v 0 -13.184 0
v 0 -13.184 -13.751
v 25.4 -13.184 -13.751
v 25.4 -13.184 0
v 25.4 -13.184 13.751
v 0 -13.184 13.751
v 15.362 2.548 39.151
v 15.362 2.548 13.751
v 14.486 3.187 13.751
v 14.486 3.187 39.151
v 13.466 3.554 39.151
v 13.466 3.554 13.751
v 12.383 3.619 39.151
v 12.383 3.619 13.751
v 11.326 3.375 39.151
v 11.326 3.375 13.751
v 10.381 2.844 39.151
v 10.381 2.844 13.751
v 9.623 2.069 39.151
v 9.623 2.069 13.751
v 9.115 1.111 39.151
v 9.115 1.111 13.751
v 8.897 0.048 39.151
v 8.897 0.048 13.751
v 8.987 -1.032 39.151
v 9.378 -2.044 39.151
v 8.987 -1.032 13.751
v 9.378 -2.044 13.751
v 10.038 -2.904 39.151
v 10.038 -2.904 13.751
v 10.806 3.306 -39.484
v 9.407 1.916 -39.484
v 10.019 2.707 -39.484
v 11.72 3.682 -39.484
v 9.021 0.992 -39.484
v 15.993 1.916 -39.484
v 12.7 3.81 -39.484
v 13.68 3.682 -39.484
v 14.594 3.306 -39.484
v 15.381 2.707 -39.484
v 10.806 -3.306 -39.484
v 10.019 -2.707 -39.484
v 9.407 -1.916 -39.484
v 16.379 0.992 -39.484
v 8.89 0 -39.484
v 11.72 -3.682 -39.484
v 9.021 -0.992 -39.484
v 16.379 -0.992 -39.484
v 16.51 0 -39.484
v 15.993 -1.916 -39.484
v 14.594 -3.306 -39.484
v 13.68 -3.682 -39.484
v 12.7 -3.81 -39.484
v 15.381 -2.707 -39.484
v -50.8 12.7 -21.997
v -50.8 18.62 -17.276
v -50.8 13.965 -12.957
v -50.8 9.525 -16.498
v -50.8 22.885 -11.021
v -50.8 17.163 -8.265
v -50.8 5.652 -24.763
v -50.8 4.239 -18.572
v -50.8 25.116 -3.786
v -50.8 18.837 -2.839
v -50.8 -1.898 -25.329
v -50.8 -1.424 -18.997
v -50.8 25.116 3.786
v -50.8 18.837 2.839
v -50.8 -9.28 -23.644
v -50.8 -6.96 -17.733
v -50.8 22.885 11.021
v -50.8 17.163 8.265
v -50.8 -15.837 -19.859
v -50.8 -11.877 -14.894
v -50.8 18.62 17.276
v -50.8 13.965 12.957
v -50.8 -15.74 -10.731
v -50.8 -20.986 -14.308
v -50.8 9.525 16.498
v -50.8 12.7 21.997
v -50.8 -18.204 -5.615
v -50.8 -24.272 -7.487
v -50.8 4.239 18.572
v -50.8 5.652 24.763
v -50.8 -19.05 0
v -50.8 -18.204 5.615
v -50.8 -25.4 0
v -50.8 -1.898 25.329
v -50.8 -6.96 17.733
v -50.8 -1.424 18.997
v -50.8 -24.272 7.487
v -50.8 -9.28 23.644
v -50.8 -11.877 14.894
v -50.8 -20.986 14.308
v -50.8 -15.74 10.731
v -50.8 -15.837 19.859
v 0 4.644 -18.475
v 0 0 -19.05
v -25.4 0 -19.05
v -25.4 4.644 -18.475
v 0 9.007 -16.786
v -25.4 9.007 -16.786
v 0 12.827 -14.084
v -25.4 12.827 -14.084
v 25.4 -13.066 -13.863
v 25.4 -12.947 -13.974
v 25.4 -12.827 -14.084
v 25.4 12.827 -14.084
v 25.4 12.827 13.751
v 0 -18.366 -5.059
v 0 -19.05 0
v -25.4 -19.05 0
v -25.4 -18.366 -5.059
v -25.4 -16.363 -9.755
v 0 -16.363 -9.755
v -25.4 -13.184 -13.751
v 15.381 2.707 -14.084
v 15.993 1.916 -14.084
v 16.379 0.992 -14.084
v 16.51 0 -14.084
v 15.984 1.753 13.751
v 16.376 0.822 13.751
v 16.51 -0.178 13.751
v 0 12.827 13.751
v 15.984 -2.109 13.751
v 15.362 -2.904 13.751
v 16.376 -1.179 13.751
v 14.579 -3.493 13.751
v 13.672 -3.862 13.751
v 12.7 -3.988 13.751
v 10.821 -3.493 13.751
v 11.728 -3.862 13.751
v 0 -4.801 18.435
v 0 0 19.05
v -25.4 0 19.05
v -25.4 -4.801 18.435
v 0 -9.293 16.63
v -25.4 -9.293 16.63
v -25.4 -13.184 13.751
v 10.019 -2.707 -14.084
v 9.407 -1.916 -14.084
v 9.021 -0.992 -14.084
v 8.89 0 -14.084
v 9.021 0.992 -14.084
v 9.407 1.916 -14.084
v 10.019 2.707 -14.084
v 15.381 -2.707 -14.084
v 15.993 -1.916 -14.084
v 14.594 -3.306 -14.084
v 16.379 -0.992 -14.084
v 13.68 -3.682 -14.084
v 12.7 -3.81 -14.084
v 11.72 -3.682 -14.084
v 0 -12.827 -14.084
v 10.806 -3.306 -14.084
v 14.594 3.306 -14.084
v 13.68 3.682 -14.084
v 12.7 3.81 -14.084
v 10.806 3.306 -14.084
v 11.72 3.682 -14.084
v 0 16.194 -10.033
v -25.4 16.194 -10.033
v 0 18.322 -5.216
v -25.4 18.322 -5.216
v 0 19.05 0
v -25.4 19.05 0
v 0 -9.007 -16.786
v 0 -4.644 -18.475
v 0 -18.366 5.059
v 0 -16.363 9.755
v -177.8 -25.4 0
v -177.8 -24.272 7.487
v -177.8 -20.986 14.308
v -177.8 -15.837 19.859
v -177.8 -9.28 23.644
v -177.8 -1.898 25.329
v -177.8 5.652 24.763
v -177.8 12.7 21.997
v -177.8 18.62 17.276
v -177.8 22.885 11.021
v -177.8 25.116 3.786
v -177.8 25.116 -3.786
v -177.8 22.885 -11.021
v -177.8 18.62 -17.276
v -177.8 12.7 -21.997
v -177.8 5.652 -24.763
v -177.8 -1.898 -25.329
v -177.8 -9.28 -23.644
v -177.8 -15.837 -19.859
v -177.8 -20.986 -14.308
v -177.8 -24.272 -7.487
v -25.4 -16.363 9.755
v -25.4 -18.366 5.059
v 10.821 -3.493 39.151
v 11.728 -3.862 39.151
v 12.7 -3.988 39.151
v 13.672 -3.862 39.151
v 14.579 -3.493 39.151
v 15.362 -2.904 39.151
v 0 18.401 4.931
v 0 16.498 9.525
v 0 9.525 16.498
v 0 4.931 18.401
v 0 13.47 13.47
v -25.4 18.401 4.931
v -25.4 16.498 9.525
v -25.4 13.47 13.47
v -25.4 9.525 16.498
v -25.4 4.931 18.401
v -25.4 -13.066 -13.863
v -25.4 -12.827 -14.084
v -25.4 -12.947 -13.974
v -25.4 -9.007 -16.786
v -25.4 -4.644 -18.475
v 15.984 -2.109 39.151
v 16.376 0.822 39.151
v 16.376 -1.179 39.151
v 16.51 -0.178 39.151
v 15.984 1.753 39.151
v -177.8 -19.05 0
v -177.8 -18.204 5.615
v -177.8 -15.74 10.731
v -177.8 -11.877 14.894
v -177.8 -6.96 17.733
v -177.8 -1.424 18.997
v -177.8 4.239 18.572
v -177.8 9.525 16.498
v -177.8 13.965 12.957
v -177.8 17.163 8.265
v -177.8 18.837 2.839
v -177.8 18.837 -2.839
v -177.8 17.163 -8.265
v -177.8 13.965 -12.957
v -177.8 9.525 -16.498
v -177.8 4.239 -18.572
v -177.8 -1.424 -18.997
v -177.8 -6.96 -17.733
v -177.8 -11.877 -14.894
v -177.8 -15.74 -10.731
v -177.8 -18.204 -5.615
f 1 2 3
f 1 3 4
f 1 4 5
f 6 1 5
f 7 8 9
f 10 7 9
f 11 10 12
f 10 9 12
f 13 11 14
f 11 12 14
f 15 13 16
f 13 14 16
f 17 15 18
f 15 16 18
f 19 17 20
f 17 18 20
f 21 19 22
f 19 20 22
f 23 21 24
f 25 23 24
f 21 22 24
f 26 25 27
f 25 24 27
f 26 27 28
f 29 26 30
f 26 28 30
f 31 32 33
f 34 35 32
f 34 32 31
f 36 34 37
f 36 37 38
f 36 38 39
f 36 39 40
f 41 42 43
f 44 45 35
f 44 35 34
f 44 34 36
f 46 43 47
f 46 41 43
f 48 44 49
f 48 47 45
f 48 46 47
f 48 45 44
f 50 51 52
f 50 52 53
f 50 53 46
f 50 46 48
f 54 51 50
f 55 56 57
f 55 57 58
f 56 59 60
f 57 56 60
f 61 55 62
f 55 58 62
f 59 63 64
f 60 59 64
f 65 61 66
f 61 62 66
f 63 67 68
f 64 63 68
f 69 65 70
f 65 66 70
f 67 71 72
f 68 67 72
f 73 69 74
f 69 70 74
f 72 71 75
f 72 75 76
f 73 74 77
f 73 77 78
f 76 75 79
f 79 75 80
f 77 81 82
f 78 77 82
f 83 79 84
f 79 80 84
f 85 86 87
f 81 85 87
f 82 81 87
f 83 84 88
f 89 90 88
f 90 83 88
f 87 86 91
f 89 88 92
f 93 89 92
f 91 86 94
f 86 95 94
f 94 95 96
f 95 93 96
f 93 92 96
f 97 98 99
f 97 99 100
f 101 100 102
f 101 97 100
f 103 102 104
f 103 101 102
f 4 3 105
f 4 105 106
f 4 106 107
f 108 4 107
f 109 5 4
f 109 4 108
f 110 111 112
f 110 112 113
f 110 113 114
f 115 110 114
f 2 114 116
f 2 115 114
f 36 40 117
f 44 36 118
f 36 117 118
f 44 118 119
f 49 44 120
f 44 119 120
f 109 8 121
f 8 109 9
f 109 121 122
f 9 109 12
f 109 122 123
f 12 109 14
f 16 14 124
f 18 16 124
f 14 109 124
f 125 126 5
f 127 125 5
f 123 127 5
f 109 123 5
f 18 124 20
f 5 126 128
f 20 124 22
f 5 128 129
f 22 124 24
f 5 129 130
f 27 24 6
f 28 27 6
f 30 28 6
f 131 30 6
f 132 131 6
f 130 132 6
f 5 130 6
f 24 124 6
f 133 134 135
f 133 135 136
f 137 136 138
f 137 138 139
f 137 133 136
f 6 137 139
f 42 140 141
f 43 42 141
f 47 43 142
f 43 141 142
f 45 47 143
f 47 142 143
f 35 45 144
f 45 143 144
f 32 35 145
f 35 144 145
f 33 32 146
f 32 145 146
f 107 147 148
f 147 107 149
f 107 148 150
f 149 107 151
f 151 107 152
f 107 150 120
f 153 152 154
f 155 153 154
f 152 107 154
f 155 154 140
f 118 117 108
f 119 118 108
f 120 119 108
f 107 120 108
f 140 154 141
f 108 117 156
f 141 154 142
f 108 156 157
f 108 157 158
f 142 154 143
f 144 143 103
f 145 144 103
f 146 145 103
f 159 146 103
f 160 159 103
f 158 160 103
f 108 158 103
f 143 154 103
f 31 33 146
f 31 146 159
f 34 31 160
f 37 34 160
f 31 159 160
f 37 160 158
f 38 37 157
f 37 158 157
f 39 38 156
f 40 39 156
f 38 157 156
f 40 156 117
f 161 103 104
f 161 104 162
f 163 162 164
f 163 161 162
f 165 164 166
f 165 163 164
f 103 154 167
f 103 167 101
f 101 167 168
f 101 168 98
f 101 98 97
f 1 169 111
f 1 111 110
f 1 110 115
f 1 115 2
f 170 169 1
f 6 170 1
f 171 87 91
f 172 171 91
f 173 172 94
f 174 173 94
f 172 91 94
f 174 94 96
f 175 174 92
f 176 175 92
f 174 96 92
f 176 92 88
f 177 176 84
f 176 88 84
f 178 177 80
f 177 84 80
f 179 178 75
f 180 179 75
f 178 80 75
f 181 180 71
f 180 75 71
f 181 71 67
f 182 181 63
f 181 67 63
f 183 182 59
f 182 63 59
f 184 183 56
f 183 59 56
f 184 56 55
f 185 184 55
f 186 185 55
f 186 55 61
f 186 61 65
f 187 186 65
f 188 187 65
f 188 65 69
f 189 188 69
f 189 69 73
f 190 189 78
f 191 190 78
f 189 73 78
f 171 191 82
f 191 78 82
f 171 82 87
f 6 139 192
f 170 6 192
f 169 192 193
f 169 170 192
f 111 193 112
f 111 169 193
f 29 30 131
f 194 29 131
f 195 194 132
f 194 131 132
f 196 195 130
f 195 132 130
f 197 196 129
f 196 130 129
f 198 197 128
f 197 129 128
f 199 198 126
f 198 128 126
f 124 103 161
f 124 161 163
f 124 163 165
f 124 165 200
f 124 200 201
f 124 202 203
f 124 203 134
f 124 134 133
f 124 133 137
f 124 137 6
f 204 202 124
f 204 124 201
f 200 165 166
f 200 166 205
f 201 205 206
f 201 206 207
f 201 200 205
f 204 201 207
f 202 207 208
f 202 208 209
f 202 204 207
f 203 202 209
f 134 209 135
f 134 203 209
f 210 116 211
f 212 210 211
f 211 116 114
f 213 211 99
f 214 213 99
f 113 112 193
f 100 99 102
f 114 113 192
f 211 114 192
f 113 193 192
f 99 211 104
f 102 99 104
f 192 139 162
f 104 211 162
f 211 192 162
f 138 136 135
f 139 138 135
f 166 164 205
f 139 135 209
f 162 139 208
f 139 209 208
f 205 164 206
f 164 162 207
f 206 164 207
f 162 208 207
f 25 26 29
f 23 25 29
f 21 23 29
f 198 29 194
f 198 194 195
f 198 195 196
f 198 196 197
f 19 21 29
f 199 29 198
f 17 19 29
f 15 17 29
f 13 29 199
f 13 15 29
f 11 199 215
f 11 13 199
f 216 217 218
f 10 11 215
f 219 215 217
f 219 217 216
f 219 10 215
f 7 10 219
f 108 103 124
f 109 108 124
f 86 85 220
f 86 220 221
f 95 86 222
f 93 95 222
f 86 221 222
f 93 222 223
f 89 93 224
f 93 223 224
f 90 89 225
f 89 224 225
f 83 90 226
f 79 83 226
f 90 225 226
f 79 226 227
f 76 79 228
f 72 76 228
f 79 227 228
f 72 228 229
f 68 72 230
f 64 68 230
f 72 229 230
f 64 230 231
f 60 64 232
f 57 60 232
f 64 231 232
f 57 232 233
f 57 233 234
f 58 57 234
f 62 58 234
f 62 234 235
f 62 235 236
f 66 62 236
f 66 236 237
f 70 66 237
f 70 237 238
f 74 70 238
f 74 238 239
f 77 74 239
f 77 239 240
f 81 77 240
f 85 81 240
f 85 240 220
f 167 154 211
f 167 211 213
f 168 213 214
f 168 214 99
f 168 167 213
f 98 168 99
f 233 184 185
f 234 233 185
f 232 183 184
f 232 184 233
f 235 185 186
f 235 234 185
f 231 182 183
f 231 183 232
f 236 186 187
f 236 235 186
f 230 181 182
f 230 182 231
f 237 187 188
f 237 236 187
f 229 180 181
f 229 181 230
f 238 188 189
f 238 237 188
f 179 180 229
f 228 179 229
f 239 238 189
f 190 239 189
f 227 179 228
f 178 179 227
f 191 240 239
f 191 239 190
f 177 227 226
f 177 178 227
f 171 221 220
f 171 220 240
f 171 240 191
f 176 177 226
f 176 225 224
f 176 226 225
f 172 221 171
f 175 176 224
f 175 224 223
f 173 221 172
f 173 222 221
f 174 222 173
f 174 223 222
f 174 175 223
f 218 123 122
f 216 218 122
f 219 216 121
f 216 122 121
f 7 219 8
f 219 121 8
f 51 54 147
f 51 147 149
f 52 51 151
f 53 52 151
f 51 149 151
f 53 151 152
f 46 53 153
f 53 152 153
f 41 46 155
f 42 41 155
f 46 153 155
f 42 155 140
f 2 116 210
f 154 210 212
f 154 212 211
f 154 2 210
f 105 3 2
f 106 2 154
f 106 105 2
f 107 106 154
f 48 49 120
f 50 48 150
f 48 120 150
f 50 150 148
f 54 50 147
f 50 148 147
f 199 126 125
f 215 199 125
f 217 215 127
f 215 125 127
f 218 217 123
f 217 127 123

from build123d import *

# Parameters (mm, degrees)
F0_W     = 12.8274819265
F0_H     = 14.0839698744
F0_H_2   = 13.7507947324
F0_W_2   = 13.1840109309
F1_DEPTH = 25.4
F2_DEPTH = 25.4
F5_DEPTH = 25.4
F6_DEPTH = 25.4
F8_R     = 25.4
F9_DEPTH = 127
F11_D    = 38.1


with BuildPart() as f1:
    # F0 (on Right) → F1 (new body)
    with BuildSketch(Plane.YZ):
        with Locations((6.4137409633, -7.0419849372)):
            Rectangle(F0_W, F0_H)
        with Locations((6.4137409633, 6.8753973662)):
            Rectangle(F0_W, F0_H_2)
        with Locations((-6.5920054655, 6.8753973662)):
            Rectangle(F0_W_2, F0_H_2)
        with BuildLine():
            Line((-12.8274819265, -14.0839698744), (0, -14.0839698744))
            Line((0, -14.0839698744), (0, 0))
            Line((0, 0), (-13.1840109309, 0))
            Line((-13.1840109309, 0), (-13.1840109309, -13.7507947324))
            ThreePointArc((-13.1840109309, -13.7507947324), (-13.0068132756, -13.9185239308), (-12.8274819265, -14.0839698744))
        make_face()
    extrude(amount=F1_DEPTH)

    # F0 (on Right) → F2 (join)
    with BuildSketch(Plane.YZ):
        with BuildLine():
            Line((12.8274819265, 0), (19.05, 0))
            ThreePointArc((19.05, 0), (13.4703841816, 13.4703841816), (0, 19.05))
            Line((0, 19.05), (0, 13.7507947324))
            Line((0, 13.7507947324), (12.8274819265, 13.7507947324))
            Line((12.8274819265, 13.7507947324), (12.8274819265, 0))
        make_face()
        with BuildLine():
            ThreePointArc((12.8274819265, -14.0839698744), (17.4250685895, -7.6986677191), (19.05, 0))
            Line((19.05, 0), (12.8274819265, 0))
            Line((12.8274819265, 0), (12.8274819265, -14.0839698744))
        make_face()
        with BuildLine():
            Line((0, 13.7507947324), (0, 19.05))
            ThreePointArc((0, 19.05), (-7.104571076, 17.6756207763), (-13.1840109309, 13.7507947324))
            Line((-13.1840109309, 13.7507947324), (0, 13.7507947324))
        make_face()
        with BuildLine():
            ThreePointArc((0, -19.05), (6.877604012, -17.7651643126), (12.8274819265, -14.0839698744))
            Line((12.8274819265, -14.0839698744), (0, -14.0839698744))
            Line((0, -14.0839698744), (0, -19.05))
        make_face()
        with Locations((6.4137409633, -7.0419849372)):
            Rectangle(F0_W, F0_H)
        with Locations((6.4137409633, 6.8753973662)):
            Rectangle(F0_W, F0_H_2)
        with BuildLine():
            Line((-13.1840109309, 0), (-13.1840109309, 13.7507947324))
            ThreePointArc((-13.1840109309, 13.7507947324), (-17.5222416978, 7.4748609273), (-19.05, 0))
            Line((-19.05, 0), (-13.1840109309, 0))
        make_face()
        with Locations((-6.5920054655, 6.8753973662)):
            Rectangle(F0_W_2, F0_H_2)
        with BuildLine():
            ThreePointArc((-12.8274819265, -14.0839698744), (-6.877604012, -17.7651643126), (0, -19.05))
            Line((0, -19.05), (0, -14.0839698744))
            Line((0, -14.0839698744), (-12.8274819265, -14.0839698744))
        make_face()
        with BuildLine():
            Line((-12.8274819265, -14.0839698744), (0, -14.0839698744))
            Line((0, -14.0839698744), (0, 0))
            Line((0, 0), (-13.1840109309, 0))
            Line((-13.1840109309, 0), (-13.1840109309, -13.7507947324))
            ThreePointArc((-13.1840109309, -13.7507947324), (-13.0068132756, -13.9185239308), (-12.8274819265, -14.0839698744))
        make_face()
        with BuildLine():
            Line((-13.1840109309, 0), (-19.05, 0))
            ThreePointArc((-19.05, 0), (-17.5222416978, -7.4748609273), (-13.1840109309, -13.7507947324))
            Line((-13.1840109309, -13.7507947324), (-13.1840109309, 0))
        make_face()
    extrude(amount=-F2_DEPTH)

    # F3 (on face) → F5 (join)
    with BuildSketch(Plane.XY.offset(13.7507947324)):
        with BuildLine():
            ThreePointArc((15.3618449693, 2.5476631123), (12.7, 3.6317354978), (10.0381550307, 2.5476631123))
            Line((10.0381550307, 2.5476631123), (12.7, -0.1782645022))
            Line((12.7, -0.1782645022), (15.3618449693, 2.5476631123))
        make_face()
        with BuildLine():
            Line((12.7, -0.1782645022), (10.0381550307, 2.5476631123))
            ThreePointArc((10.0381550307, 2.5476631123), (8.89, -0.1782645022), (10.0381550307, -2.9041921166))
            Line((10.0381550307, -2.9041921166), (12.7, -0.1782645022))
        make_face()
        with BuildLine():
            Line((15.3618449693, -2.9041921166), (12.7, -0.1782645022))
            Line((12.7, -0.1782645022), (10.0381550307, -2.9041921166))
            ThreePointArc((10.0381550307, -2.9041921166), (12.7, -3.9882645022), (15.3618449693, -2.9041921166))
        make_face()
        with BuildLine():
            Line((15.3618449693, 2.5476631123), (12.7, -0.1782645022))
            Line((12.7, -0.1782645022), (15.3618449693, -2.9041921166))
            ThreePointArc((15.3618449693, -2.9041921166), (16.211248306, -1.6571949716), (16.51, -0.1782645022))
            ThreePointArc((16.51, -0.1782645022), (16.211248306, 1.3006659673), (15.3618449693, 2.5476631123))
        make_face()
    extrude(amount=F5_DEPTH)

    # F4 (on face) → F6 (join)
    with BuildSketch(Plane(origin=(0, 0, -14.0839698744), x_dir=(1, 0, 0), z_dir=(0, 0, -1))):
        with BuildLine():
            ThreePointArc((10.0194105643, -2.7074970503), (12.7, -3.81), (15.3805894357, -2.7074970503))
            Line((15.3805894357, -2.7074970503), (12.7, 0))
            Line((12.7, 0), (10.0194105643, -2.7074970503))
        make_face()
        with BuildLine():
            Line((12.7, 0), (15.3805894357, -2.7074970503))
            ThreePointArc((15.3805894357, -2.7074970503), (16.2163294605, -1.4668084827), (16.51, 0))
            ThreePointArc((16.51, 0), (16.2163294605, 1.4668084827), (15.3805894357, 2.7074970503))
            Line((15.3805894357, 2.7074970503), (12.7, 0))
        make_face()
        with BuildLine():
            Line((10.0194105643, 2.7074970503), (12.7, 0))
            Line((12.7, 0), (15.3805894357, 2.7074970503))
            ThreePointArc((15.3805894357, 2.7074970503), (12.7, 3.81), (10.0194105643, 2.7074970503))
        make_face()
        with BuildLine():
            Line((10.0194105643, -2.7074970503), (12.7, 0))
            Line((12.7, 0), (10.0194105643, 2.7074970503))
            ThreePointArc((10.0194105643, 2.7074970503), (8.89, 0), (10.0194105643, -2.7074970503))
        make_face()
    extrude(amount=F6_DEPTH)


with BuildPart() as f9:
    # F8 (on offset) → F9 (new body)
    with BuildSketch(Plane(origin=(-50.8, 0, 0), x_dir=(0, -1, 0), z_dir=(-1, 0, 0))):
        Circle(F8_R)
    extrude(amount=F9_DEPTH)

    # F11 (through all)
    with Locations(Plane.YZ.offset(-50.8)):
        with Locations((0, 0)):
            Hole(F11_D / 2)


solid = Compound([f1.part, f9.part])
